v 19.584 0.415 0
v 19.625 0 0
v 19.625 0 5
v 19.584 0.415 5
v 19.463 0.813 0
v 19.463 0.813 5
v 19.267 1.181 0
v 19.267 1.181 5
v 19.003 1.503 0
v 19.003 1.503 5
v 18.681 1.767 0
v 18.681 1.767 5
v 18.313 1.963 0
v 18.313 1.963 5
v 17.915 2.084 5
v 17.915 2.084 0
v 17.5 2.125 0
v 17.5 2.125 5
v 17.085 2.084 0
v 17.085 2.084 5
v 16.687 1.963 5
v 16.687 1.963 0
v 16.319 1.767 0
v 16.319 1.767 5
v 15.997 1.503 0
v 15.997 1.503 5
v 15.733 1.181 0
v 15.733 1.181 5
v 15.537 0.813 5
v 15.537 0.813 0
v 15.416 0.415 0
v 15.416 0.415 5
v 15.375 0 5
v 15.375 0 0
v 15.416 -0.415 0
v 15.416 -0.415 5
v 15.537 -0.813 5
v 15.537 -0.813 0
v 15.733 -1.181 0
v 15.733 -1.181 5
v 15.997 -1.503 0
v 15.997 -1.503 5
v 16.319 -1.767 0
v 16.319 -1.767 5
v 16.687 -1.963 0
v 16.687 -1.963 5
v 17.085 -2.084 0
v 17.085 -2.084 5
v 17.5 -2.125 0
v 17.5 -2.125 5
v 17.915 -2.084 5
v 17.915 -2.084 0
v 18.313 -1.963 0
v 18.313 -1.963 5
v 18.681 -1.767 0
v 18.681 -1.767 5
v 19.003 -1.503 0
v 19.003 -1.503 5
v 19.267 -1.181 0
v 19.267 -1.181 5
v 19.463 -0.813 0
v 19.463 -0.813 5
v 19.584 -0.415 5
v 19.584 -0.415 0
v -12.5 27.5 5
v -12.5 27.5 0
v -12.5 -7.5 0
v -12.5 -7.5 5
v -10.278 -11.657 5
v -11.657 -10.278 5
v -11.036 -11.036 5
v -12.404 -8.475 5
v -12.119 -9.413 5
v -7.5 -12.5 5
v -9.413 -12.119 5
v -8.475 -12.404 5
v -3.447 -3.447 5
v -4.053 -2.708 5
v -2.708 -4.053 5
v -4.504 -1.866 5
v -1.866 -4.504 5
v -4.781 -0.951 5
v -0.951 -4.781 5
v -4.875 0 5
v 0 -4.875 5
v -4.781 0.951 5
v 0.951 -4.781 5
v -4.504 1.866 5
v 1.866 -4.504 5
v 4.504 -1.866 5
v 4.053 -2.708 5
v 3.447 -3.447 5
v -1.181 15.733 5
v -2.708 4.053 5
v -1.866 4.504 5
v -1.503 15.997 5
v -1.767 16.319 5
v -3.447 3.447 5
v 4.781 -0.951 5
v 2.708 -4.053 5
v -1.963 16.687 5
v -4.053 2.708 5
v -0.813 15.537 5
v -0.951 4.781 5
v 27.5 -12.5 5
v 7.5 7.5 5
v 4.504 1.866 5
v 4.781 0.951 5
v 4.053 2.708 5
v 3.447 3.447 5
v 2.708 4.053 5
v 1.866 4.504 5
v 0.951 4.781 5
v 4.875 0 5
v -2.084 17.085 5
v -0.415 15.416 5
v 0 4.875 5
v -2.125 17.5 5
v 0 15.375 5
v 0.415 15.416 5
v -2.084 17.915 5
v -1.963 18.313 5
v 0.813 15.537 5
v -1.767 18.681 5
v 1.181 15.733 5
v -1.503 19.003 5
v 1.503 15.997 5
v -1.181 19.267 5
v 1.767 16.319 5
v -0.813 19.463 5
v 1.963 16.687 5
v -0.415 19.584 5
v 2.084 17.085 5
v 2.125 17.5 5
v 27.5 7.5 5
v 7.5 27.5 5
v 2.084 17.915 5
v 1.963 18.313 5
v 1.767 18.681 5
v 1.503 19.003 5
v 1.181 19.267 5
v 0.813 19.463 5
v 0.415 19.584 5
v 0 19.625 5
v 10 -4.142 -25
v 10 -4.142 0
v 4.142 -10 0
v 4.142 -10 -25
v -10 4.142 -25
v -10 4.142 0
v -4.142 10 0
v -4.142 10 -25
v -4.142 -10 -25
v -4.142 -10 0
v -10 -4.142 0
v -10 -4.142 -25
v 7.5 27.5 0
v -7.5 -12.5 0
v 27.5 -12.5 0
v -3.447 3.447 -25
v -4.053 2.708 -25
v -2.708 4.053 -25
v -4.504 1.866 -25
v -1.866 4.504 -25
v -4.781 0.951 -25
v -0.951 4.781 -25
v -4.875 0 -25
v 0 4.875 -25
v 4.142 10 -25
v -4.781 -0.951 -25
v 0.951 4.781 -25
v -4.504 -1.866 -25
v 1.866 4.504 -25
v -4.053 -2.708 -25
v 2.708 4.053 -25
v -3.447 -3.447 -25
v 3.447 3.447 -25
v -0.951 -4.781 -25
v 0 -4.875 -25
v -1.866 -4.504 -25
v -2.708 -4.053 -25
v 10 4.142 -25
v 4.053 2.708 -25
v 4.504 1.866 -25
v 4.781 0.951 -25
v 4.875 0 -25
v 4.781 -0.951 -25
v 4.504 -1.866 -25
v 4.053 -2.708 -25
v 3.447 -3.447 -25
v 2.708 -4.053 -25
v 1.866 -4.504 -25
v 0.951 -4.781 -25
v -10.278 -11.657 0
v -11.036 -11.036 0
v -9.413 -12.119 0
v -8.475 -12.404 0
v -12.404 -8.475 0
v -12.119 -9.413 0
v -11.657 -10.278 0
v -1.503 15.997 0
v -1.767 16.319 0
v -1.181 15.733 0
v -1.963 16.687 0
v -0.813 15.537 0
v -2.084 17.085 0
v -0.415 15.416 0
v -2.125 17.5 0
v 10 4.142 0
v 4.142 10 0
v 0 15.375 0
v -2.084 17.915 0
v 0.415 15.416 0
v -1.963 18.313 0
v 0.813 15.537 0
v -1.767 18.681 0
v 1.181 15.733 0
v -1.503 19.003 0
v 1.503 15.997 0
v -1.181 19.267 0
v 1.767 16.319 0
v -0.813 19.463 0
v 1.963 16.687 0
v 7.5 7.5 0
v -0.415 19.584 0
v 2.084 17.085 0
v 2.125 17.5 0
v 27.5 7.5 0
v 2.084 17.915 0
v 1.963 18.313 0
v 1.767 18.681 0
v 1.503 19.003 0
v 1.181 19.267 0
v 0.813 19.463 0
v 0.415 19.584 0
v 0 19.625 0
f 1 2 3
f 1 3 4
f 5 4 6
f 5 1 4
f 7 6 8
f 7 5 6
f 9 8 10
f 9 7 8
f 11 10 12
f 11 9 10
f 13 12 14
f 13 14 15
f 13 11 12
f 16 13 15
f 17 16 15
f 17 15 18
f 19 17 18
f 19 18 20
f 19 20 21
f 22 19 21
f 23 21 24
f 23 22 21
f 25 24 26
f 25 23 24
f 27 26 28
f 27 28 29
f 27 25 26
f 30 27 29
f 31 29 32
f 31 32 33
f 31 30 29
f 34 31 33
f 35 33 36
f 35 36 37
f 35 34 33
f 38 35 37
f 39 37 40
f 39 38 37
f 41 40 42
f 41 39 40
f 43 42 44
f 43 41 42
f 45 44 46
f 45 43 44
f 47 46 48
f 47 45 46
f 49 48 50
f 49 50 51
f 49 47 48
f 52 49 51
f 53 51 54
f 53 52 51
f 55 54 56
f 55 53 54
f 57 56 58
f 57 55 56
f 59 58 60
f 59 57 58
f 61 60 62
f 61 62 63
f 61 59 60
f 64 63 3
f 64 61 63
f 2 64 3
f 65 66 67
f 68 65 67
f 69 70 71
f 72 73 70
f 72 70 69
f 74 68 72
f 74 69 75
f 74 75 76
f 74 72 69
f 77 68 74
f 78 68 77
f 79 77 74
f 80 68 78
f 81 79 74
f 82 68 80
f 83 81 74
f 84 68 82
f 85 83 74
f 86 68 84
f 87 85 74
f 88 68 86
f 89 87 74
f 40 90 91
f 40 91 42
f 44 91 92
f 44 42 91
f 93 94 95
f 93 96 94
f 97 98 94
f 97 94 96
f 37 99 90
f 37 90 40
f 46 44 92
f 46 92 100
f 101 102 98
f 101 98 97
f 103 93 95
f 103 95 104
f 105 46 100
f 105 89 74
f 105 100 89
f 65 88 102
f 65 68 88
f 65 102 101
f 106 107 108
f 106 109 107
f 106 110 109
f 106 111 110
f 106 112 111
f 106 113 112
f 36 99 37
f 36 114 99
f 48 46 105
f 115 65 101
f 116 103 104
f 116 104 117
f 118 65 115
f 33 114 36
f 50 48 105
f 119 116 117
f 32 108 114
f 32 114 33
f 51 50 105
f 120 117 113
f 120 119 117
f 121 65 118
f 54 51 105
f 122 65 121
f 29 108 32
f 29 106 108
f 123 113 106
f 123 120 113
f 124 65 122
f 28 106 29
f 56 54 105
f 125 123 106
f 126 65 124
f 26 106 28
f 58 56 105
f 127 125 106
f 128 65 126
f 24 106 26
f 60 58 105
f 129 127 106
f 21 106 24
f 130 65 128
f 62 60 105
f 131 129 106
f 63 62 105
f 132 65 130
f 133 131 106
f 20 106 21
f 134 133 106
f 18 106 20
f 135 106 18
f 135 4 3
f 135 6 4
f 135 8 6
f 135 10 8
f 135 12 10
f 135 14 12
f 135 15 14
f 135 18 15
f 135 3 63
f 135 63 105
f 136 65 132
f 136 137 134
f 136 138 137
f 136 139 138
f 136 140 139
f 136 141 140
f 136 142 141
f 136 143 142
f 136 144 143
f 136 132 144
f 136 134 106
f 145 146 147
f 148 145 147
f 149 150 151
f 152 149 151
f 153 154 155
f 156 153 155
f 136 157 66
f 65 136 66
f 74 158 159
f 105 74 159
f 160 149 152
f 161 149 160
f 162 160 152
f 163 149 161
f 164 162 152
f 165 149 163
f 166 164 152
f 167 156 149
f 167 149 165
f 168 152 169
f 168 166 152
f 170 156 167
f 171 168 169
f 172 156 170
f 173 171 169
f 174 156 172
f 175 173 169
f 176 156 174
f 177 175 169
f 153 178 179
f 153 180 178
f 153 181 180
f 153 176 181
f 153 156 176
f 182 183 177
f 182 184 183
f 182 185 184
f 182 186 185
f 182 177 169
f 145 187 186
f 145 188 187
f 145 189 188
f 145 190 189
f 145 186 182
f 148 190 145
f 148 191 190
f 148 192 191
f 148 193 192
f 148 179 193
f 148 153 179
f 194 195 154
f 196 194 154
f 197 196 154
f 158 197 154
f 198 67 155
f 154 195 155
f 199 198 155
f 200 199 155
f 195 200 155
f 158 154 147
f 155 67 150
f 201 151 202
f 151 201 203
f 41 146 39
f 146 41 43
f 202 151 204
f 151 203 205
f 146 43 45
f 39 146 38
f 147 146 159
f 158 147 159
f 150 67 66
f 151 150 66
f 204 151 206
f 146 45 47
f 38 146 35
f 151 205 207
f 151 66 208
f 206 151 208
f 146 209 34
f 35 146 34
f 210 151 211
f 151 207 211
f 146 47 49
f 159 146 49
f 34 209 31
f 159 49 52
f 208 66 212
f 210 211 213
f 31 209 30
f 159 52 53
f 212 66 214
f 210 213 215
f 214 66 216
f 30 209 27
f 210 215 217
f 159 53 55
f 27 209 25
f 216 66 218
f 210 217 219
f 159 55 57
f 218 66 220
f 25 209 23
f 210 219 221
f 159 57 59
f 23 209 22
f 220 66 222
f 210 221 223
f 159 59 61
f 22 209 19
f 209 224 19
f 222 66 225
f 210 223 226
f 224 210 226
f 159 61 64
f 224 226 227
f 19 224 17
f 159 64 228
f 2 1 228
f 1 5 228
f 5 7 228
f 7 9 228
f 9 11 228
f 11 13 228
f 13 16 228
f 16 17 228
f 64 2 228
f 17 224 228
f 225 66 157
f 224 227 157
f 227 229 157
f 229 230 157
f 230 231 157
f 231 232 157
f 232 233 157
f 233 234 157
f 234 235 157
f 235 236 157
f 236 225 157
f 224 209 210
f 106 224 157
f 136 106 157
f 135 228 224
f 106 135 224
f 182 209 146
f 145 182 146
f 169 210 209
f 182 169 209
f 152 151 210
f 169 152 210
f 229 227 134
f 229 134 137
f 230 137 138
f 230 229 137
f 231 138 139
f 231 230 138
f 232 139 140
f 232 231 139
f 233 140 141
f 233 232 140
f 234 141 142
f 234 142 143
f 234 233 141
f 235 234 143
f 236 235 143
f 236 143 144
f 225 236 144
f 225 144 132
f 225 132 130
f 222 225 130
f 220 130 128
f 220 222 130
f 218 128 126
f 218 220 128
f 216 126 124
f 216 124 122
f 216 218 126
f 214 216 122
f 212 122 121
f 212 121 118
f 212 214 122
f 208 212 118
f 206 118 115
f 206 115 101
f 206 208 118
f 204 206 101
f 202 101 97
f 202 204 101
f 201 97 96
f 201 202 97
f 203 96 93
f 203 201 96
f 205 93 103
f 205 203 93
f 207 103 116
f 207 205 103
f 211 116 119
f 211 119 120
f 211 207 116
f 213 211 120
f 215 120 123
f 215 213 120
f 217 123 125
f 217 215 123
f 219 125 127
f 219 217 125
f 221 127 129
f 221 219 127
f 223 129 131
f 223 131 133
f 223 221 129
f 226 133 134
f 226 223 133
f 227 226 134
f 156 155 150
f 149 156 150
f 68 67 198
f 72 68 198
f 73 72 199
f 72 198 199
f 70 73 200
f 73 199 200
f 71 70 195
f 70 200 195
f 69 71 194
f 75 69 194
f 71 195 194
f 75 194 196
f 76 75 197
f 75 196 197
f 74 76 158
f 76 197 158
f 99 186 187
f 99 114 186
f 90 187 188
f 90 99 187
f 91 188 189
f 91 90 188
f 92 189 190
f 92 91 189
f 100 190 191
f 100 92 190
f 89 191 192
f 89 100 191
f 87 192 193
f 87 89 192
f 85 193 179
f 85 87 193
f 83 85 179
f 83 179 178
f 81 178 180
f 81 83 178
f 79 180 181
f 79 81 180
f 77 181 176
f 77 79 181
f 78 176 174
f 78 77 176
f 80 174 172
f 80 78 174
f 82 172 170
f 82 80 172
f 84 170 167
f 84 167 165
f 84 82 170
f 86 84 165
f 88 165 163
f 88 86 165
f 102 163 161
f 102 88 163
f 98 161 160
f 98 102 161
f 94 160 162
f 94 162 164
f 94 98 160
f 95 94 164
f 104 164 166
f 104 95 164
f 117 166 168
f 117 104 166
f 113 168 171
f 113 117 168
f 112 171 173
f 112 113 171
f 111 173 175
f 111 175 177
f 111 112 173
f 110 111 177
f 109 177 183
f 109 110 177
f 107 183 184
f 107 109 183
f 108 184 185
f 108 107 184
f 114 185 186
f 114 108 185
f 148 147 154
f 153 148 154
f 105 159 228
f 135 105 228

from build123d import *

# Parameters (mm, degrees)
F0_R     = 4.875
F0_R_2   = 2.125
F1_DEPTH = 5
F2_R     = 4.875
F3_DEPTH = 25


with BuildPart() as f1:
    # F0 (on Top) → F1 (new body)
    with BuildSketch(Plane.XY):
        with BuildLine():
            Line((-12.5, 27.5), (-12.5, 0))
            Line((-12.5, 0), (-12.5, -7.5))
            ThreePointArc((-12.5, -7.5), (-11.035534, -11.035534), (-7.5, -12.5))
            Line((-7.5, -12.5), (27.5, -12.5))
            Line((27.5, -12.5), (27.5, 7.5))
            Line((27.5, 7.5), (7.5, 7.5))
            Line((7.5, 7.5), (7.5, 27.5))
            Line((7.5, 27.5), (-12.5, 27.5))
        make_face()
        Circle(F0_R, mode=Mode.SUBTRACT)
        with Locations((17.5, 0)):
            Circle(F0_R_2, mode=Mode.SUBTRACT)
        with Locations((0, 17.5)):
            Circle(F0_R_2, mode=Mode.SUBTRACT)
    extrude(amount=F1_DEPTH)

    # F2 (on face) → F3 (join)
    with BuildSketch(Plane(origin=(0, 0, 0), x_dir=(1, 0, 0), z_dir=(0, 0, -1))):
        Polygon((10, -4.142136), (10, 4.142136), (4.142136, 10), (-4.142136, 10), (-10, 4.142136), (-10, -4.142136), (-4.142136, -10), (4.142136, -10), align=None)
        Circle(F2_R, mode=Mode.SUBTRACT)
    extrude(amount=F3_DEPTH)


solid = f1.part
